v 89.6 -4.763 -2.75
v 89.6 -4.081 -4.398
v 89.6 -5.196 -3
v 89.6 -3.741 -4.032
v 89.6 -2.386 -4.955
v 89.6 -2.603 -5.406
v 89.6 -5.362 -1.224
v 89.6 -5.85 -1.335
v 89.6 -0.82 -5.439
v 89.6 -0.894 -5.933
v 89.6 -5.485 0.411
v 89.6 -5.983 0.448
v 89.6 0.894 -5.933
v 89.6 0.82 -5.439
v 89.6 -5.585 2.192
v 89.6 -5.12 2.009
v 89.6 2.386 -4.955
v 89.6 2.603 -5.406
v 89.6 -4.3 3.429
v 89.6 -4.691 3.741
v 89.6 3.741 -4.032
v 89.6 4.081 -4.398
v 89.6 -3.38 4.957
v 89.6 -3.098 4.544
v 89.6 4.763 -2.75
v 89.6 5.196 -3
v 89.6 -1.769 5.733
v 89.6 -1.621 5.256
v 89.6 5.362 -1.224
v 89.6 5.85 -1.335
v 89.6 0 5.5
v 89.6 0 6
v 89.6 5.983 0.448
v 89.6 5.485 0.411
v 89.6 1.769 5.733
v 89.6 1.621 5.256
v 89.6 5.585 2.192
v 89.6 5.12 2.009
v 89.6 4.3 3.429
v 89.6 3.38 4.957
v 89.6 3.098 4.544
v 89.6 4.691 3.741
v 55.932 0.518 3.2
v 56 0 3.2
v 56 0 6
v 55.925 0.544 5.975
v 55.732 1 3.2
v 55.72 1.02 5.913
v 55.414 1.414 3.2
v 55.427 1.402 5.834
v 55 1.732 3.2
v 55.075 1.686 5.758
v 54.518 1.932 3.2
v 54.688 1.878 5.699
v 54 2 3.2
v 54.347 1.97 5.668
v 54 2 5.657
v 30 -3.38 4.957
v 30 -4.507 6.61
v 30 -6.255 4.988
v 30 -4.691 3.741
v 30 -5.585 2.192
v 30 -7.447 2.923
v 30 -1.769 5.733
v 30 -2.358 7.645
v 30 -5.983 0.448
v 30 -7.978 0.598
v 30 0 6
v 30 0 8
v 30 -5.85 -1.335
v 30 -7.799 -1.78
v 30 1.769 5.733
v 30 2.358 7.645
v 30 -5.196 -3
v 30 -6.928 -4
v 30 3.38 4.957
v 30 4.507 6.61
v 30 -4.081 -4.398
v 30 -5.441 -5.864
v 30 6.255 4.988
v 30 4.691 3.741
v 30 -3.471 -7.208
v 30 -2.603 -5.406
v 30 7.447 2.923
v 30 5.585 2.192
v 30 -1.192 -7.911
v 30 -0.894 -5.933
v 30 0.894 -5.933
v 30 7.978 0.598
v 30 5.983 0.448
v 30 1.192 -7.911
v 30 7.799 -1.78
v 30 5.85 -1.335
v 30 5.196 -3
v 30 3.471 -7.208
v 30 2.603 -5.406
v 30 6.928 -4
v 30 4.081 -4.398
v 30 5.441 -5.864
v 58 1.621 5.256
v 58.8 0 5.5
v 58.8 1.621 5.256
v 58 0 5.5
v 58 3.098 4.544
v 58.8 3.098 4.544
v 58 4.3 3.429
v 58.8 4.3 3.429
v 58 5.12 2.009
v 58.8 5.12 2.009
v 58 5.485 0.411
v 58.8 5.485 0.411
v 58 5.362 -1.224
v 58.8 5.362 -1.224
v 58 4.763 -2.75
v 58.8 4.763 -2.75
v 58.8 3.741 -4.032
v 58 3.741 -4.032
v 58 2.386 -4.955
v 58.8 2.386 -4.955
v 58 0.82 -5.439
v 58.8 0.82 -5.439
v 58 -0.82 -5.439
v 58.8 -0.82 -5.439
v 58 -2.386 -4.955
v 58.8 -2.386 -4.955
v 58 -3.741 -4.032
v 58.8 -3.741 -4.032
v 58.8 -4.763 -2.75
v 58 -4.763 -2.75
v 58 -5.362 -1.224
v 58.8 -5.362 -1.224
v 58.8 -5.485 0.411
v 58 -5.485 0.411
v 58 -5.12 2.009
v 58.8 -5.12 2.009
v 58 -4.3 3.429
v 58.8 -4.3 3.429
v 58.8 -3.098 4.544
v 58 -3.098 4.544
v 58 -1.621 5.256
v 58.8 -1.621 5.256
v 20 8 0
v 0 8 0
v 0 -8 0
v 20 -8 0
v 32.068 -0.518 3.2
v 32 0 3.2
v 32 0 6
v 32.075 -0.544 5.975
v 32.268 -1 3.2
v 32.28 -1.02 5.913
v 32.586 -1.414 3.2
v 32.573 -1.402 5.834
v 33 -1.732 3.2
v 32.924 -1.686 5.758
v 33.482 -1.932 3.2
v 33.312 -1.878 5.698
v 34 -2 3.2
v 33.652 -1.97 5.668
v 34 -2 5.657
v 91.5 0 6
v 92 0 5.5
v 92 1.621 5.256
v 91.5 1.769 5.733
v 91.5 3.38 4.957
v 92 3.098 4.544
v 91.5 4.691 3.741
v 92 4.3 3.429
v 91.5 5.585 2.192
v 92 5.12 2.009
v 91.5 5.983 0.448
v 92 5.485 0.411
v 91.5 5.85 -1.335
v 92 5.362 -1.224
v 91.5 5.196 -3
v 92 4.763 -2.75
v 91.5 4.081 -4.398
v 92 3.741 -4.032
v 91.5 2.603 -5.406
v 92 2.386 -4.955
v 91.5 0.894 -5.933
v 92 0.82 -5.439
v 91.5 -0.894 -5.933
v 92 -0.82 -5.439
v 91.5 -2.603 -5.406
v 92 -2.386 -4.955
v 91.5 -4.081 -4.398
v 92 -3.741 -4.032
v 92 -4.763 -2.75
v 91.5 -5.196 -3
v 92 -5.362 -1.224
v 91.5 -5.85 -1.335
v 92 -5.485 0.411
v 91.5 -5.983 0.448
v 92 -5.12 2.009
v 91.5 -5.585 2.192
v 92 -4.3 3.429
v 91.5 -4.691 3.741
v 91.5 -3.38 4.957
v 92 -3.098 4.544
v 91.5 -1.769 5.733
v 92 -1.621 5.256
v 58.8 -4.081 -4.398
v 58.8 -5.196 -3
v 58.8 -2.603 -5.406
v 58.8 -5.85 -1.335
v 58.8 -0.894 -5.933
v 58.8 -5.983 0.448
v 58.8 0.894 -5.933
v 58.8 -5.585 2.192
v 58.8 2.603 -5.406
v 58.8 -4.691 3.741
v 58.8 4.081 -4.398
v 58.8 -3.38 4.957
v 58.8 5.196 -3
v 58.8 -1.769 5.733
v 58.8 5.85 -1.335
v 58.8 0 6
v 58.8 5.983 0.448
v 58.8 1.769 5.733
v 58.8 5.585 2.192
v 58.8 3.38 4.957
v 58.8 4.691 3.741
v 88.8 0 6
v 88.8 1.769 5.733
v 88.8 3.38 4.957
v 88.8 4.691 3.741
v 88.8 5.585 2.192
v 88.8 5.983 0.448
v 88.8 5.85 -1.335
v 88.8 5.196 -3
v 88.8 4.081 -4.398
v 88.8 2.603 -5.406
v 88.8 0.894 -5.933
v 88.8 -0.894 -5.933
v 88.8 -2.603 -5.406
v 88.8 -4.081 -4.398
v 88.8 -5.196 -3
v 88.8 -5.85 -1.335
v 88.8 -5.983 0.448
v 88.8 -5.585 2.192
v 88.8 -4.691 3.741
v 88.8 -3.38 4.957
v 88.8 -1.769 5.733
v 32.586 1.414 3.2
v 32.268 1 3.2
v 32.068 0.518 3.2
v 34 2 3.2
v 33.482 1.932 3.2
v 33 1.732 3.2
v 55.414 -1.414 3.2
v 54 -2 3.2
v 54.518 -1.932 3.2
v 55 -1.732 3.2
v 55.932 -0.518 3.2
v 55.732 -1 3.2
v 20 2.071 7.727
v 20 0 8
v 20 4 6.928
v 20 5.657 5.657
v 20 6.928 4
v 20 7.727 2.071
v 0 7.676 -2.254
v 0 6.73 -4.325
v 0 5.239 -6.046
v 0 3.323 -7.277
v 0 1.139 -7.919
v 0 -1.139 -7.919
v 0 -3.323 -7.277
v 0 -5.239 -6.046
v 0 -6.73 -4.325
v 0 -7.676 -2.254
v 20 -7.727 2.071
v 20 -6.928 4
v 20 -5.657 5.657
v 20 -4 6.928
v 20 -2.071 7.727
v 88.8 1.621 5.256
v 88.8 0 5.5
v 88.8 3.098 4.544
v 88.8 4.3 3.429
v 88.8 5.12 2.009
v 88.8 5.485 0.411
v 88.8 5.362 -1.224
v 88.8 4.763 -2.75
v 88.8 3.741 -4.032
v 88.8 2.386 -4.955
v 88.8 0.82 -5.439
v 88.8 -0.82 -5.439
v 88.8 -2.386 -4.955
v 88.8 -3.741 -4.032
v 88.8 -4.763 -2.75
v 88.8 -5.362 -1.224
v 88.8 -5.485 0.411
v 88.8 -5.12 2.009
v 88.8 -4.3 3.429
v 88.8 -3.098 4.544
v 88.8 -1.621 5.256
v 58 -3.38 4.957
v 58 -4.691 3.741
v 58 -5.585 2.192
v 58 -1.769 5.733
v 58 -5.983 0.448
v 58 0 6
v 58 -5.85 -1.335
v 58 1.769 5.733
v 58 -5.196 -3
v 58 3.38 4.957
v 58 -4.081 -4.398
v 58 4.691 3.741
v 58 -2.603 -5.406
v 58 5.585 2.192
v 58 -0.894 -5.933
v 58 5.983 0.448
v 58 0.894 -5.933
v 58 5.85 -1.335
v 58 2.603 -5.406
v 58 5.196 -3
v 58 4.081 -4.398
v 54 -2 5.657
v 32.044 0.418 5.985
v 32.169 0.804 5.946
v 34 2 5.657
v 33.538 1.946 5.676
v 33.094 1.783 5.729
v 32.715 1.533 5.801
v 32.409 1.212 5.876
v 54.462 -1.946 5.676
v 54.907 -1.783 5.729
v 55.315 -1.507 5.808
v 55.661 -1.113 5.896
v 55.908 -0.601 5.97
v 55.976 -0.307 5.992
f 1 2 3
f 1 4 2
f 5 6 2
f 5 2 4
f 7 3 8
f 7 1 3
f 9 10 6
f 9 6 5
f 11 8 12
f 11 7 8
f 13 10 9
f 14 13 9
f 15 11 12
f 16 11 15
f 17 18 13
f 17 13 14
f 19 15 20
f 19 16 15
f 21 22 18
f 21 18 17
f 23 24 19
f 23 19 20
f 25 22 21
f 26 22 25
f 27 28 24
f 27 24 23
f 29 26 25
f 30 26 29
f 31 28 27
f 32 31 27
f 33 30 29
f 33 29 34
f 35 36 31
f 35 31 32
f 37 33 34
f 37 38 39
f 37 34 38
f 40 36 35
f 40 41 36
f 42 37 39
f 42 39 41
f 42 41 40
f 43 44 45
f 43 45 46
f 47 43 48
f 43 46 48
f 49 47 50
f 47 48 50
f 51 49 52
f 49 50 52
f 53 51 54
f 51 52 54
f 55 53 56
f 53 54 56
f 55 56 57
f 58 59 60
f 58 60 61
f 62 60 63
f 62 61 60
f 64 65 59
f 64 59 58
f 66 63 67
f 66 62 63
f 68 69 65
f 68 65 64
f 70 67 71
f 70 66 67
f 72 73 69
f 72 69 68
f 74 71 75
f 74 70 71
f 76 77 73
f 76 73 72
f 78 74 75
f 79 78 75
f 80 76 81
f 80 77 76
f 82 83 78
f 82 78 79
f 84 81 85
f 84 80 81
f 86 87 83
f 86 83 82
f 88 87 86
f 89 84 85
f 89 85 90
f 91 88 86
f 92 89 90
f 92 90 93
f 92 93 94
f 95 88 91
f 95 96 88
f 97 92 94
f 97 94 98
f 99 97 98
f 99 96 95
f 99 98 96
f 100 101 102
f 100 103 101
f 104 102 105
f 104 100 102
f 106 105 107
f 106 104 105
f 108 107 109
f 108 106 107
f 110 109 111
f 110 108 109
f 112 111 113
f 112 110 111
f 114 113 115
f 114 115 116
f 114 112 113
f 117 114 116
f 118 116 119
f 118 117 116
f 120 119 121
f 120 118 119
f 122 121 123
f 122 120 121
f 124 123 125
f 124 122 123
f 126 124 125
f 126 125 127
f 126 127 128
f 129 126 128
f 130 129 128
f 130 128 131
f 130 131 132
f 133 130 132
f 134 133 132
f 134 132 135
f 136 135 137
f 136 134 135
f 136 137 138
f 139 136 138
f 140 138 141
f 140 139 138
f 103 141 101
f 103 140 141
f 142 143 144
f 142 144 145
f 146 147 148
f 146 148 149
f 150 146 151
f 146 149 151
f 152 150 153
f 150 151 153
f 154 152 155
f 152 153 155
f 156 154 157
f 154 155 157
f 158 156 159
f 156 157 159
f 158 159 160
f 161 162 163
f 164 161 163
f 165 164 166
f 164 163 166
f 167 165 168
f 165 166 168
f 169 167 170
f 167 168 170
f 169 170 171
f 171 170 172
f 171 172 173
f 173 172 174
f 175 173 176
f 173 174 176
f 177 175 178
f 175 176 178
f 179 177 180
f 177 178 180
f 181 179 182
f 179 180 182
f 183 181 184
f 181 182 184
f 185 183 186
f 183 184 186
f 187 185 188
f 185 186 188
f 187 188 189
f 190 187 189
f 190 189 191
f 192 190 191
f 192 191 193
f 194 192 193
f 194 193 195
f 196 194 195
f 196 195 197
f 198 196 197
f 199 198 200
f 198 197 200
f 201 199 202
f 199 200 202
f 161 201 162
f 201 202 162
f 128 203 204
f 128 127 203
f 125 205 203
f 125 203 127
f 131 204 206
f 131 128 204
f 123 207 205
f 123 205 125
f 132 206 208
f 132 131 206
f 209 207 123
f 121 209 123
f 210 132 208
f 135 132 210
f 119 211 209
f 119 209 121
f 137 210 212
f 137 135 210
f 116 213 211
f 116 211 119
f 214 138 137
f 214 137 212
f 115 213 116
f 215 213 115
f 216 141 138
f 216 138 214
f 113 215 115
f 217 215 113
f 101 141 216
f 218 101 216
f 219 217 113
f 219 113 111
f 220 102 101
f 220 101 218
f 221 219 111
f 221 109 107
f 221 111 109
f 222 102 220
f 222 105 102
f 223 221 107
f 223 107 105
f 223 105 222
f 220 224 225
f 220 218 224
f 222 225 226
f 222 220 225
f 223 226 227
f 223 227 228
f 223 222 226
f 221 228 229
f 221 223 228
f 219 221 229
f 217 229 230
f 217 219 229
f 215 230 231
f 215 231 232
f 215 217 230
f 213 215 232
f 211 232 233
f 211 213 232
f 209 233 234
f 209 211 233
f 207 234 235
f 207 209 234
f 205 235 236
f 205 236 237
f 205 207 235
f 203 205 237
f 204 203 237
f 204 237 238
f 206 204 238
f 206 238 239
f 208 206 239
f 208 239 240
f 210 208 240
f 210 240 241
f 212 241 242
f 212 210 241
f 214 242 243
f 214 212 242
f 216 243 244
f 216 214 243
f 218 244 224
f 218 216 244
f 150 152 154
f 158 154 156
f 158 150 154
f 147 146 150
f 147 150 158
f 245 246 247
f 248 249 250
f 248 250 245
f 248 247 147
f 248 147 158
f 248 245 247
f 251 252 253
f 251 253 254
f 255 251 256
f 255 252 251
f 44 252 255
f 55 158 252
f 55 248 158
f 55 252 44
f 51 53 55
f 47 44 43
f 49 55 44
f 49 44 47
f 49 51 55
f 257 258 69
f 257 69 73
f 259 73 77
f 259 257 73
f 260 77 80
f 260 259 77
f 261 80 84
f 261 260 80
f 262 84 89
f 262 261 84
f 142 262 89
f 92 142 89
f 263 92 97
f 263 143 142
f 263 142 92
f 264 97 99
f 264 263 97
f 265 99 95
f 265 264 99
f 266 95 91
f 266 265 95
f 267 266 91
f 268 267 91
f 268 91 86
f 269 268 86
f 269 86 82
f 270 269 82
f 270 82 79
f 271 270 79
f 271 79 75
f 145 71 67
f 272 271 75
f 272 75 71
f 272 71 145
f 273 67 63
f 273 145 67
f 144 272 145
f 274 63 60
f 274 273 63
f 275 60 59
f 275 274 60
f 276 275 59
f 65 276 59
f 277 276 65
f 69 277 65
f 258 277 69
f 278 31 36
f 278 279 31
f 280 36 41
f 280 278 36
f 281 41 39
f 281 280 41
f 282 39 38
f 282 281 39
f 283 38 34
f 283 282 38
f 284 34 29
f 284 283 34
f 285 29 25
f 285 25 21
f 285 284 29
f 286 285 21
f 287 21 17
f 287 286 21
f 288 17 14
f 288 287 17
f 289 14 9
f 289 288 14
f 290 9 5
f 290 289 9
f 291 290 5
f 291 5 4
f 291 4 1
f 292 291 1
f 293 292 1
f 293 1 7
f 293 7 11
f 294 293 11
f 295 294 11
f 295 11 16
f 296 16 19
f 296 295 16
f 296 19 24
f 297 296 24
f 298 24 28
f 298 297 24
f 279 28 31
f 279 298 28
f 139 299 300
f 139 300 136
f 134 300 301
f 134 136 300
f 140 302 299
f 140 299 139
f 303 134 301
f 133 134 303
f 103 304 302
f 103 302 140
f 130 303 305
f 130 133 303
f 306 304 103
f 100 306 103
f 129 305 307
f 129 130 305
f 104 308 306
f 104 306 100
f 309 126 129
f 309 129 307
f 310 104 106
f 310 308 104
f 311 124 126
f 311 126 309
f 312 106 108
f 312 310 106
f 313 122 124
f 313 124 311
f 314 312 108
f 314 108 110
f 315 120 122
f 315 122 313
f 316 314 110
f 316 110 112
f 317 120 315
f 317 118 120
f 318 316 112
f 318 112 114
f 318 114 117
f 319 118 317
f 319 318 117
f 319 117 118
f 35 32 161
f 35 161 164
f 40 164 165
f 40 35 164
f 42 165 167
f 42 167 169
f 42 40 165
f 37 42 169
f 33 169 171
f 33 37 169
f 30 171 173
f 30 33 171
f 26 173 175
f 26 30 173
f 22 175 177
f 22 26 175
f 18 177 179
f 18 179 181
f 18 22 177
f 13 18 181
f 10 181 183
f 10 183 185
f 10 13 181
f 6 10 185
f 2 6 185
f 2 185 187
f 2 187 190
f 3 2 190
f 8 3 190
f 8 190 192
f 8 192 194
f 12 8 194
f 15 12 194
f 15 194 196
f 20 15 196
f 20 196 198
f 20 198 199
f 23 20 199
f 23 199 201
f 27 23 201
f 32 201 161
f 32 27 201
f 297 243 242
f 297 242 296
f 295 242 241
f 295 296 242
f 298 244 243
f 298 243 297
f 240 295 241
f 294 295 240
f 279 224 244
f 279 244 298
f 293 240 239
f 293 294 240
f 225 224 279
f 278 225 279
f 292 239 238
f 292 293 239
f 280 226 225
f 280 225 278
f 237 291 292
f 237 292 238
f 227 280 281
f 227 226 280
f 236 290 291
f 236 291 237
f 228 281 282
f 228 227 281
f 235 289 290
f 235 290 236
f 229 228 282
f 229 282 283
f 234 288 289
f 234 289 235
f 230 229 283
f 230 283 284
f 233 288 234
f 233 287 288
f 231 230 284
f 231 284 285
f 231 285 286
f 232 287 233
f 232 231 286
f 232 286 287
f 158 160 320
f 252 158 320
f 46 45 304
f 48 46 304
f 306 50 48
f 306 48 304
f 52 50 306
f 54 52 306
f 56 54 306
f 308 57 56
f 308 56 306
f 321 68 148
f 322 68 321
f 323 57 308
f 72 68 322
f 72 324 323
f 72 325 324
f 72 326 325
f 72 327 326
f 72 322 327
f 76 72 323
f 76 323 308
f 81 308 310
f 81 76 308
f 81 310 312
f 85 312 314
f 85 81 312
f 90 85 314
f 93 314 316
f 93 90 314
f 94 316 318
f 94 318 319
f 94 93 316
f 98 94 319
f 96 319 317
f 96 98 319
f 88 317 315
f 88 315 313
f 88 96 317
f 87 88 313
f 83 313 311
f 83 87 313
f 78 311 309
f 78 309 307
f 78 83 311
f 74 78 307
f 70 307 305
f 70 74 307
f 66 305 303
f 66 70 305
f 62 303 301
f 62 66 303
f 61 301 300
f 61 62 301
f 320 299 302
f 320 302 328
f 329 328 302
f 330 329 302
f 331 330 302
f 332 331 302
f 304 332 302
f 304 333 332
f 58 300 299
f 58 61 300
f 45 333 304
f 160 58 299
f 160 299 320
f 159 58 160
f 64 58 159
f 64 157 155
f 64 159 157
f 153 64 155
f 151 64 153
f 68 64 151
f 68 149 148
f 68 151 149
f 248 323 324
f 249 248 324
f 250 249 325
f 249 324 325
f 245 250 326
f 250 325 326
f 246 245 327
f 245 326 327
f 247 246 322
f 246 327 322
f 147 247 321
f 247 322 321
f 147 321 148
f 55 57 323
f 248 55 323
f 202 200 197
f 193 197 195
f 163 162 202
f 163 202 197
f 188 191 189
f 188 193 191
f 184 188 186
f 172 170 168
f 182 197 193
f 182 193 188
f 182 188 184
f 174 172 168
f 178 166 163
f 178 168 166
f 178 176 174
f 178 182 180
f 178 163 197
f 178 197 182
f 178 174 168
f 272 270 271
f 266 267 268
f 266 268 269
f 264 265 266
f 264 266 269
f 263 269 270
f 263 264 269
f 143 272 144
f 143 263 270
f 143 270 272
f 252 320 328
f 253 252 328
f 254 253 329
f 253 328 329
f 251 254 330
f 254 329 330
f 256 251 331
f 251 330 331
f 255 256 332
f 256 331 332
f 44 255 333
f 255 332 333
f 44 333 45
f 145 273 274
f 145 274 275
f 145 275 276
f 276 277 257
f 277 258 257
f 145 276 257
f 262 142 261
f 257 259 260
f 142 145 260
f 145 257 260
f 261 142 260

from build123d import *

# Parameters (mm, degrees)
F4_W     = 20
F4_H     = 25.605118
F5_DEPTH = 8
F7_DEPTH = 2.8
F8_SIZE  = 0.5


with BuildPart() as f1:
    # F0 (on Front) → F1 (revolve)
    with BuildSketch(Plane.XZ):
        Polygon((0, 8), (0, 0), (92, 0), (92, 6), (89.6, 6), (89.6, 5.5), (88.8, 5.5), (88.8, 6), (58.8, 6), (58.8, 5.5), (58, 5.5), (58, 6), (30, 6), (30, 8), align=None)
    revolve(axis=Axis((46, 0, 0), (-1, 0, 0)))

    # F4 (on offset) → F5 (cut)
    with BuildSketch(Plane.XY.offset(8)):
        with Locations((10, -2.362951)):
            Rectangle(F4_W, F4_H)
    extrude(amount=-F5_DEPTH, mode=Mode.SUBTRACT)

    # F6 (on offset) → F7 (cut)
    with BuildSketch(Plane.XY.offset(6)):
        with BuildLine():
            Line((54, 2), (34, 2))
            ThreePointArc((34, 2), (32.585786, 1.414214), (32, 0))
            ThreePointArc((32, 0), (32.585786, -1.414214), (34, -2))
            Line((34, -2), (54, -2))
            ThreePointArc((54, -2), (55.414214, -1.414214), (56, 0))
            ThreePointArc((56, 0), (55.414214, 1.414214), (54, 2))
        make_face()
    extrude(amount=-F7_DEPTH, mode=Mode.SUBTRACT)

    # F8
    f8_edges = [f1.edges().sort_by_distance(p)[0] for p in [
        (92, 0, -6),
    ]]
    chamfer(f8_edges, length=F8_SIZE)


solid = f1.part
